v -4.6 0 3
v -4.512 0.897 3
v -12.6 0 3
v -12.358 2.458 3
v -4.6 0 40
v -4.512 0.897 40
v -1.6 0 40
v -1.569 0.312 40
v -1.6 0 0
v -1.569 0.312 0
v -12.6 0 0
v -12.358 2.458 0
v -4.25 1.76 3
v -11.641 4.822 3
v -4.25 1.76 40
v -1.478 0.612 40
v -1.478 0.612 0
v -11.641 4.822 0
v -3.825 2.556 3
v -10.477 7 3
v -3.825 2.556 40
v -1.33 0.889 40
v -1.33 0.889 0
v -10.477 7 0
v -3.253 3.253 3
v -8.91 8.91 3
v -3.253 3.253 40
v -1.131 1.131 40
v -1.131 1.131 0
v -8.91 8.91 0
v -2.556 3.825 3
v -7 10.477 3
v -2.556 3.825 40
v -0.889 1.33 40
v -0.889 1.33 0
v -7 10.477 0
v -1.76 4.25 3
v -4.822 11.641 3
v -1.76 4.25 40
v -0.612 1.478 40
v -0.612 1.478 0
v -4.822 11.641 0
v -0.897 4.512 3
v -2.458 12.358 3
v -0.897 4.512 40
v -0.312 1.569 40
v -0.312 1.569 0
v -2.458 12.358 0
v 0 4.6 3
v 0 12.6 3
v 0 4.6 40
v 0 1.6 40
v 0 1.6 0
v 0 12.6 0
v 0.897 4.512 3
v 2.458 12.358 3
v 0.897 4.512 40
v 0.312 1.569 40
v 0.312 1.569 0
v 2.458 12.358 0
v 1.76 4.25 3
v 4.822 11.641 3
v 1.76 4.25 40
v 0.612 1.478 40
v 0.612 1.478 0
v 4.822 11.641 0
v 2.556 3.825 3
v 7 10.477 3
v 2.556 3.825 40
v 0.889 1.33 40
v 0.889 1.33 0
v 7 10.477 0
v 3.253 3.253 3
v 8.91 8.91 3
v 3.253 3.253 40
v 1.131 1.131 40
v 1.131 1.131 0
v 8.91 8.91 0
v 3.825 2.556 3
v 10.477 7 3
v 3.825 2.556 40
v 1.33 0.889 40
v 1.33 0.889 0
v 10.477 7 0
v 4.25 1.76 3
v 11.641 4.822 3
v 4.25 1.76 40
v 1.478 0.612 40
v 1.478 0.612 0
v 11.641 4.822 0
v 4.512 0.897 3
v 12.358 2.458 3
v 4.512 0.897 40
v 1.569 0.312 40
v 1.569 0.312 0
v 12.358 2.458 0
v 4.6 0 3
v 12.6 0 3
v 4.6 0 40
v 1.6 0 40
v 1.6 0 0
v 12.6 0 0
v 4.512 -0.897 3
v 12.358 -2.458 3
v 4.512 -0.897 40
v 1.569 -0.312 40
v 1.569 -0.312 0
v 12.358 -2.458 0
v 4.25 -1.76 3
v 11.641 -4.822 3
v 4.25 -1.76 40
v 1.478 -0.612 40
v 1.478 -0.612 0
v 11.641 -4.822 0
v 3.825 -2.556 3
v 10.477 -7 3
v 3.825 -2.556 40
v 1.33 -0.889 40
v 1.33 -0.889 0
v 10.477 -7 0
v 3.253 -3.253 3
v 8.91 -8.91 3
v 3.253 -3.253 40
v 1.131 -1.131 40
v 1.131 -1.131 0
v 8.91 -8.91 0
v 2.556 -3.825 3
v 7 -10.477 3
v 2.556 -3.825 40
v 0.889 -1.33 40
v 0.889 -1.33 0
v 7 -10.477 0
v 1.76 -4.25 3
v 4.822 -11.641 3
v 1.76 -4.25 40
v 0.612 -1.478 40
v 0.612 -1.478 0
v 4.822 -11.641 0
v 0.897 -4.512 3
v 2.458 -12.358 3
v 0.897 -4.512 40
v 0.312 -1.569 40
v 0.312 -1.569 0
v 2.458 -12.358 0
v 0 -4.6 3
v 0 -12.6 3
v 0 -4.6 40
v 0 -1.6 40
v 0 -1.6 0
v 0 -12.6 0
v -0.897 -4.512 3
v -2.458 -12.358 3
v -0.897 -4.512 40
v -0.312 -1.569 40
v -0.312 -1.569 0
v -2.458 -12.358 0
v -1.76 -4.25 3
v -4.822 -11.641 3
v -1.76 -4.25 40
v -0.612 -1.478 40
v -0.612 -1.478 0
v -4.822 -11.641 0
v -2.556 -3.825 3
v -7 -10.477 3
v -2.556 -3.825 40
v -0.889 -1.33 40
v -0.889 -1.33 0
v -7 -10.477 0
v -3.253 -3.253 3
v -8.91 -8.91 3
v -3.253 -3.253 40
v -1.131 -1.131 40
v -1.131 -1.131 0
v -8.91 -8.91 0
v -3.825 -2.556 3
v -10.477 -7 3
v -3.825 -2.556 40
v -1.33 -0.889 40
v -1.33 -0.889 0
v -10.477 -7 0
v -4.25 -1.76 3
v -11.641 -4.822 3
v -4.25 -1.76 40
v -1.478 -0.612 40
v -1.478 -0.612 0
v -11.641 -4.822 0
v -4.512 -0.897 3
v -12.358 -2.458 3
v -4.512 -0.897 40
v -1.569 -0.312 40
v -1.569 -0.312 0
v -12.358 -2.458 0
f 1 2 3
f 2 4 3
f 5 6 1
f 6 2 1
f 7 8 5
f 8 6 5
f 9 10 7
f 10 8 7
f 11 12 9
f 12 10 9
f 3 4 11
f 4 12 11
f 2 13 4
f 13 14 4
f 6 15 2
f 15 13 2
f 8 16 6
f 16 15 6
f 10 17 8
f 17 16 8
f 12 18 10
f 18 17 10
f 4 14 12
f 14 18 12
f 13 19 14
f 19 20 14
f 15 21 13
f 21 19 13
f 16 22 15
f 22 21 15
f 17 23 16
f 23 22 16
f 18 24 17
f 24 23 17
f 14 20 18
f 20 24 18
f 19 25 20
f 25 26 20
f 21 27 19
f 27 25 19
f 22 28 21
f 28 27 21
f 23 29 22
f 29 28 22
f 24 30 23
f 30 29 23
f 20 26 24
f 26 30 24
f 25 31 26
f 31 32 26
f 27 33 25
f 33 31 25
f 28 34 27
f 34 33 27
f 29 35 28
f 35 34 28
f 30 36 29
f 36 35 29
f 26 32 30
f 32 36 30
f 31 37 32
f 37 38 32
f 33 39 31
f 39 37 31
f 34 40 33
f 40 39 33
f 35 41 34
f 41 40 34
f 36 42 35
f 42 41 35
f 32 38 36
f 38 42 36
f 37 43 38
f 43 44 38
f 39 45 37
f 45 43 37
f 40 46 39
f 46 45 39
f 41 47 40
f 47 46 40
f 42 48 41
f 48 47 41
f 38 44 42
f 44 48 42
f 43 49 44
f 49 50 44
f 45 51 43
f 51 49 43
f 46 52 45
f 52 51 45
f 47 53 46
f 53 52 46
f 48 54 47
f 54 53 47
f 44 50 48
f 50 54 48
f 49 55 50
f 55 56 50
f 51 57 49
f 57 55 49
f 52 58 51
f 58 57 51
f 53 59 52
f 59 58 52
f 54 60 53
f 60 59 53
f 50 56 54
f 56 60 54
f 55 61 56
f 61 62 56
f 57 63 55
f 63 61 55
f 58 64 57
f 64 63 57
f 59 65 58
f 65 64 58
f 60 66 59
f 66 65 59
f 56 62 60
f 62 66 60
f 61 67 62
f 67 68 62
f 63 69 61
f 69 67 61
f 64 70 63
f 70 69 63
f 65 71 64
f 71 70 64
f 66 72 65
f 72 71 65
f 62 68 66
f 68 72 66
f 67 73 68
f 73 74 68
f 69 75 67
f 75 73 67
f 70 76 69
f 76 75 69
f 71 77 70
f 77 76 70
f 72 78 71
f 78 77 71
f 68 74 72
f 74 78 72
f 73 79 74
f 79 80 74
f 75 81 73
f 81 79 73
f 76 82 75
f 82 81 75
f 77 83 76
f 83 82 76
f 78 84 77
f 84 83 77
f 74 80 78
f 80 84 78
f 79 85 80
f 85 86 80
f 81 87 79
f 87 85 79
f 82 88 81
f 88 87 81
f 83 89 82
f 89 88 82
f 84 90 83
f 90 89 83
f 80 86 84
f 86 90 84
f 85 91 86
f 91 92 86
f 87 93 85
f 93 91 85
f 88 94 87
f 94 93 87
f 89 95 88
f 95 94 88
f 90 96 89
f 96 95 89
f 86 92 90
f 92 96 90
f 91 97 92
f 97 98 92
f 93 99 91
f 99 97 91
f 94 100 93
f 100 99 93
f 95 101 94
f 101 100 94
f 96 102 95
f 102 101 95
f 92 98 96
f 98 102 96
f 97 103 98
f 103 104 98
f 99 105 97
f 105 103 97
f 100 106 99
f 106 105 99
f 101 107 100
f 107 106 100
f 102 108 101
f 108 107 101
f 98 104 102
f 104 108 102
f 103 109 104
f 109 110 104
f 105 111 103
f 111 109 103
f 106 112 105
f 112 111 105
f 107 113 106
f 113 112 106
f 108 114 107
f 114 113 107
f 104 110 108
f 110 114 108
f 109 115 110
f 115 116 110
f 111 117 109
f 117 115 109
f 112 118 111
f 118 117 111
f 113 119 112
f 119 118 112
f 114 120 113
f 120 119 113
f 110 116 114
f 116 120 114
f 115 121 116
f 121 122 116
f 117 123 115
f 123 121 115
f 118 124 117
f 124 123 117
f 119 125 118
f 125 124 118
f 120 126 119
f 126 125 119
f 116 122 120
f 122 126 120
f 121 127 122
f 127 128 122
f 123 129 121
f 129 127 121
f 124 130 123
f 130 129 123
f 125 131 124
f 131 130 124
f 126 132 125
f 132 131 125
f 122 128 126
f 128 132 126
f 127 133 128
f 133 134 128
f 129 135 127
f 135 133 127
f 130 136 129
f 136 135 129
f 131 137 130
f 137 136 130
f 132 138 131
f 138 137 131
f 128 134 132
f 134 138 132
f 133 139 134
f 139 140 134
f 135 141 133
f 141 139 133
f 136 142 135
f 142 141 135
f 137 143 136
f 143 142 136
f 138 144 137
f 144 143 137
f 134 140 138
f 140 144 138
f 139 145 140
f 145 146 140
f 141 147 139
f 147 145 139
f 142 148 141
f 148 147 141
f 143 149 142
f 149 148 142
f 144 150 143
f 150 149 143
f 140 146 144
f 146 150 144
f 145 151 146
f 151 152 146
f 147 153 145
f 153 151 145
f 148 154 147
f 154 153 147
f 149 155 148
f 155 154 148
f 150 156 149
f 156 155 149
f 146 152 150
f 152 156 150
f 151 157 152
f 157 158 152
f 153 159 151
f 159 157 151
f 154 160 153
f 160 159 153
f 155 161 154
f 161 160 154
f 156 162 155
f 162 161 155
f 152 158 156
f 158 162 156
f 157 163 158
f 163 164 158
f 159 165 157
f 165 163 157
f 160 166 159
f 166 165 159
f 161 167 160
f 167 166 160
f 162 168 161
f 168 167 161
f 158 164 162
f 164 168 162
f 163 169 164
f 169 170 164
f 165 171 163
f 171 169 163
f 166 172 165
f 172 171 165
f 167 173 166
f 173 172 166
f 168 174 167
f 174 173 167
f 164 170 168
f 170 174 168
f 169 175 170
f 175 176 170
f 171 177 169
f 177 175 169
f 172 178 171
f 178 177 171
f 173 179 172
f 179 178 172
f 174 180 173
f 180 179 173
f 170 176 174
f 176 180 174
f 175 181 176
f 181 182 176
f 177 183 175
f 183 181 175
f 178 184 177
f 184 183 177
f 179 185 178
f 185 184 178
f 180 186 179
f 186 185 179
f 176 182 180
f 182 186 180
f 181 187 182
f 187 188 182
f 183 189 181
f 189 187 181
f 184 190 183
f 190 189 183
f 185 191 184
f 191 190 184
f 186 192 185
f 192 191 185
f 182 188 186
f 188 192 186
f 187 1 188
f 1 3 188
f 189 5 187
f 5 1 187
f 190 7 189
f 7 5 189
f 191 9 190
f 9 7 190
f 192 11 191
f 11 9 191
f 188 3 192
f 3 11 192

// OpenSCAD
$fn = 32;

// ----------------------------------------------------------------------
// Profiled standoff: flanged spacer, 40 mm long, bore 3.2 mm
// ----------------------------------------------------------------------

// --- parameters (mm) ---
revolve_angle = 360;      // full turn around the Z axis
profile_points = 6;       // points of the closed outline

profile = [[1.6, 0], [12.6, 0], [12.6, 3], [4.6, 3], [4.6, 40], [1.6, 40]];  // single closed polygon, 6 points, counter clockwise

// --- the one profile operation ---
rotate_extrude(angle = revolve_angle) polygon(points = profile);
